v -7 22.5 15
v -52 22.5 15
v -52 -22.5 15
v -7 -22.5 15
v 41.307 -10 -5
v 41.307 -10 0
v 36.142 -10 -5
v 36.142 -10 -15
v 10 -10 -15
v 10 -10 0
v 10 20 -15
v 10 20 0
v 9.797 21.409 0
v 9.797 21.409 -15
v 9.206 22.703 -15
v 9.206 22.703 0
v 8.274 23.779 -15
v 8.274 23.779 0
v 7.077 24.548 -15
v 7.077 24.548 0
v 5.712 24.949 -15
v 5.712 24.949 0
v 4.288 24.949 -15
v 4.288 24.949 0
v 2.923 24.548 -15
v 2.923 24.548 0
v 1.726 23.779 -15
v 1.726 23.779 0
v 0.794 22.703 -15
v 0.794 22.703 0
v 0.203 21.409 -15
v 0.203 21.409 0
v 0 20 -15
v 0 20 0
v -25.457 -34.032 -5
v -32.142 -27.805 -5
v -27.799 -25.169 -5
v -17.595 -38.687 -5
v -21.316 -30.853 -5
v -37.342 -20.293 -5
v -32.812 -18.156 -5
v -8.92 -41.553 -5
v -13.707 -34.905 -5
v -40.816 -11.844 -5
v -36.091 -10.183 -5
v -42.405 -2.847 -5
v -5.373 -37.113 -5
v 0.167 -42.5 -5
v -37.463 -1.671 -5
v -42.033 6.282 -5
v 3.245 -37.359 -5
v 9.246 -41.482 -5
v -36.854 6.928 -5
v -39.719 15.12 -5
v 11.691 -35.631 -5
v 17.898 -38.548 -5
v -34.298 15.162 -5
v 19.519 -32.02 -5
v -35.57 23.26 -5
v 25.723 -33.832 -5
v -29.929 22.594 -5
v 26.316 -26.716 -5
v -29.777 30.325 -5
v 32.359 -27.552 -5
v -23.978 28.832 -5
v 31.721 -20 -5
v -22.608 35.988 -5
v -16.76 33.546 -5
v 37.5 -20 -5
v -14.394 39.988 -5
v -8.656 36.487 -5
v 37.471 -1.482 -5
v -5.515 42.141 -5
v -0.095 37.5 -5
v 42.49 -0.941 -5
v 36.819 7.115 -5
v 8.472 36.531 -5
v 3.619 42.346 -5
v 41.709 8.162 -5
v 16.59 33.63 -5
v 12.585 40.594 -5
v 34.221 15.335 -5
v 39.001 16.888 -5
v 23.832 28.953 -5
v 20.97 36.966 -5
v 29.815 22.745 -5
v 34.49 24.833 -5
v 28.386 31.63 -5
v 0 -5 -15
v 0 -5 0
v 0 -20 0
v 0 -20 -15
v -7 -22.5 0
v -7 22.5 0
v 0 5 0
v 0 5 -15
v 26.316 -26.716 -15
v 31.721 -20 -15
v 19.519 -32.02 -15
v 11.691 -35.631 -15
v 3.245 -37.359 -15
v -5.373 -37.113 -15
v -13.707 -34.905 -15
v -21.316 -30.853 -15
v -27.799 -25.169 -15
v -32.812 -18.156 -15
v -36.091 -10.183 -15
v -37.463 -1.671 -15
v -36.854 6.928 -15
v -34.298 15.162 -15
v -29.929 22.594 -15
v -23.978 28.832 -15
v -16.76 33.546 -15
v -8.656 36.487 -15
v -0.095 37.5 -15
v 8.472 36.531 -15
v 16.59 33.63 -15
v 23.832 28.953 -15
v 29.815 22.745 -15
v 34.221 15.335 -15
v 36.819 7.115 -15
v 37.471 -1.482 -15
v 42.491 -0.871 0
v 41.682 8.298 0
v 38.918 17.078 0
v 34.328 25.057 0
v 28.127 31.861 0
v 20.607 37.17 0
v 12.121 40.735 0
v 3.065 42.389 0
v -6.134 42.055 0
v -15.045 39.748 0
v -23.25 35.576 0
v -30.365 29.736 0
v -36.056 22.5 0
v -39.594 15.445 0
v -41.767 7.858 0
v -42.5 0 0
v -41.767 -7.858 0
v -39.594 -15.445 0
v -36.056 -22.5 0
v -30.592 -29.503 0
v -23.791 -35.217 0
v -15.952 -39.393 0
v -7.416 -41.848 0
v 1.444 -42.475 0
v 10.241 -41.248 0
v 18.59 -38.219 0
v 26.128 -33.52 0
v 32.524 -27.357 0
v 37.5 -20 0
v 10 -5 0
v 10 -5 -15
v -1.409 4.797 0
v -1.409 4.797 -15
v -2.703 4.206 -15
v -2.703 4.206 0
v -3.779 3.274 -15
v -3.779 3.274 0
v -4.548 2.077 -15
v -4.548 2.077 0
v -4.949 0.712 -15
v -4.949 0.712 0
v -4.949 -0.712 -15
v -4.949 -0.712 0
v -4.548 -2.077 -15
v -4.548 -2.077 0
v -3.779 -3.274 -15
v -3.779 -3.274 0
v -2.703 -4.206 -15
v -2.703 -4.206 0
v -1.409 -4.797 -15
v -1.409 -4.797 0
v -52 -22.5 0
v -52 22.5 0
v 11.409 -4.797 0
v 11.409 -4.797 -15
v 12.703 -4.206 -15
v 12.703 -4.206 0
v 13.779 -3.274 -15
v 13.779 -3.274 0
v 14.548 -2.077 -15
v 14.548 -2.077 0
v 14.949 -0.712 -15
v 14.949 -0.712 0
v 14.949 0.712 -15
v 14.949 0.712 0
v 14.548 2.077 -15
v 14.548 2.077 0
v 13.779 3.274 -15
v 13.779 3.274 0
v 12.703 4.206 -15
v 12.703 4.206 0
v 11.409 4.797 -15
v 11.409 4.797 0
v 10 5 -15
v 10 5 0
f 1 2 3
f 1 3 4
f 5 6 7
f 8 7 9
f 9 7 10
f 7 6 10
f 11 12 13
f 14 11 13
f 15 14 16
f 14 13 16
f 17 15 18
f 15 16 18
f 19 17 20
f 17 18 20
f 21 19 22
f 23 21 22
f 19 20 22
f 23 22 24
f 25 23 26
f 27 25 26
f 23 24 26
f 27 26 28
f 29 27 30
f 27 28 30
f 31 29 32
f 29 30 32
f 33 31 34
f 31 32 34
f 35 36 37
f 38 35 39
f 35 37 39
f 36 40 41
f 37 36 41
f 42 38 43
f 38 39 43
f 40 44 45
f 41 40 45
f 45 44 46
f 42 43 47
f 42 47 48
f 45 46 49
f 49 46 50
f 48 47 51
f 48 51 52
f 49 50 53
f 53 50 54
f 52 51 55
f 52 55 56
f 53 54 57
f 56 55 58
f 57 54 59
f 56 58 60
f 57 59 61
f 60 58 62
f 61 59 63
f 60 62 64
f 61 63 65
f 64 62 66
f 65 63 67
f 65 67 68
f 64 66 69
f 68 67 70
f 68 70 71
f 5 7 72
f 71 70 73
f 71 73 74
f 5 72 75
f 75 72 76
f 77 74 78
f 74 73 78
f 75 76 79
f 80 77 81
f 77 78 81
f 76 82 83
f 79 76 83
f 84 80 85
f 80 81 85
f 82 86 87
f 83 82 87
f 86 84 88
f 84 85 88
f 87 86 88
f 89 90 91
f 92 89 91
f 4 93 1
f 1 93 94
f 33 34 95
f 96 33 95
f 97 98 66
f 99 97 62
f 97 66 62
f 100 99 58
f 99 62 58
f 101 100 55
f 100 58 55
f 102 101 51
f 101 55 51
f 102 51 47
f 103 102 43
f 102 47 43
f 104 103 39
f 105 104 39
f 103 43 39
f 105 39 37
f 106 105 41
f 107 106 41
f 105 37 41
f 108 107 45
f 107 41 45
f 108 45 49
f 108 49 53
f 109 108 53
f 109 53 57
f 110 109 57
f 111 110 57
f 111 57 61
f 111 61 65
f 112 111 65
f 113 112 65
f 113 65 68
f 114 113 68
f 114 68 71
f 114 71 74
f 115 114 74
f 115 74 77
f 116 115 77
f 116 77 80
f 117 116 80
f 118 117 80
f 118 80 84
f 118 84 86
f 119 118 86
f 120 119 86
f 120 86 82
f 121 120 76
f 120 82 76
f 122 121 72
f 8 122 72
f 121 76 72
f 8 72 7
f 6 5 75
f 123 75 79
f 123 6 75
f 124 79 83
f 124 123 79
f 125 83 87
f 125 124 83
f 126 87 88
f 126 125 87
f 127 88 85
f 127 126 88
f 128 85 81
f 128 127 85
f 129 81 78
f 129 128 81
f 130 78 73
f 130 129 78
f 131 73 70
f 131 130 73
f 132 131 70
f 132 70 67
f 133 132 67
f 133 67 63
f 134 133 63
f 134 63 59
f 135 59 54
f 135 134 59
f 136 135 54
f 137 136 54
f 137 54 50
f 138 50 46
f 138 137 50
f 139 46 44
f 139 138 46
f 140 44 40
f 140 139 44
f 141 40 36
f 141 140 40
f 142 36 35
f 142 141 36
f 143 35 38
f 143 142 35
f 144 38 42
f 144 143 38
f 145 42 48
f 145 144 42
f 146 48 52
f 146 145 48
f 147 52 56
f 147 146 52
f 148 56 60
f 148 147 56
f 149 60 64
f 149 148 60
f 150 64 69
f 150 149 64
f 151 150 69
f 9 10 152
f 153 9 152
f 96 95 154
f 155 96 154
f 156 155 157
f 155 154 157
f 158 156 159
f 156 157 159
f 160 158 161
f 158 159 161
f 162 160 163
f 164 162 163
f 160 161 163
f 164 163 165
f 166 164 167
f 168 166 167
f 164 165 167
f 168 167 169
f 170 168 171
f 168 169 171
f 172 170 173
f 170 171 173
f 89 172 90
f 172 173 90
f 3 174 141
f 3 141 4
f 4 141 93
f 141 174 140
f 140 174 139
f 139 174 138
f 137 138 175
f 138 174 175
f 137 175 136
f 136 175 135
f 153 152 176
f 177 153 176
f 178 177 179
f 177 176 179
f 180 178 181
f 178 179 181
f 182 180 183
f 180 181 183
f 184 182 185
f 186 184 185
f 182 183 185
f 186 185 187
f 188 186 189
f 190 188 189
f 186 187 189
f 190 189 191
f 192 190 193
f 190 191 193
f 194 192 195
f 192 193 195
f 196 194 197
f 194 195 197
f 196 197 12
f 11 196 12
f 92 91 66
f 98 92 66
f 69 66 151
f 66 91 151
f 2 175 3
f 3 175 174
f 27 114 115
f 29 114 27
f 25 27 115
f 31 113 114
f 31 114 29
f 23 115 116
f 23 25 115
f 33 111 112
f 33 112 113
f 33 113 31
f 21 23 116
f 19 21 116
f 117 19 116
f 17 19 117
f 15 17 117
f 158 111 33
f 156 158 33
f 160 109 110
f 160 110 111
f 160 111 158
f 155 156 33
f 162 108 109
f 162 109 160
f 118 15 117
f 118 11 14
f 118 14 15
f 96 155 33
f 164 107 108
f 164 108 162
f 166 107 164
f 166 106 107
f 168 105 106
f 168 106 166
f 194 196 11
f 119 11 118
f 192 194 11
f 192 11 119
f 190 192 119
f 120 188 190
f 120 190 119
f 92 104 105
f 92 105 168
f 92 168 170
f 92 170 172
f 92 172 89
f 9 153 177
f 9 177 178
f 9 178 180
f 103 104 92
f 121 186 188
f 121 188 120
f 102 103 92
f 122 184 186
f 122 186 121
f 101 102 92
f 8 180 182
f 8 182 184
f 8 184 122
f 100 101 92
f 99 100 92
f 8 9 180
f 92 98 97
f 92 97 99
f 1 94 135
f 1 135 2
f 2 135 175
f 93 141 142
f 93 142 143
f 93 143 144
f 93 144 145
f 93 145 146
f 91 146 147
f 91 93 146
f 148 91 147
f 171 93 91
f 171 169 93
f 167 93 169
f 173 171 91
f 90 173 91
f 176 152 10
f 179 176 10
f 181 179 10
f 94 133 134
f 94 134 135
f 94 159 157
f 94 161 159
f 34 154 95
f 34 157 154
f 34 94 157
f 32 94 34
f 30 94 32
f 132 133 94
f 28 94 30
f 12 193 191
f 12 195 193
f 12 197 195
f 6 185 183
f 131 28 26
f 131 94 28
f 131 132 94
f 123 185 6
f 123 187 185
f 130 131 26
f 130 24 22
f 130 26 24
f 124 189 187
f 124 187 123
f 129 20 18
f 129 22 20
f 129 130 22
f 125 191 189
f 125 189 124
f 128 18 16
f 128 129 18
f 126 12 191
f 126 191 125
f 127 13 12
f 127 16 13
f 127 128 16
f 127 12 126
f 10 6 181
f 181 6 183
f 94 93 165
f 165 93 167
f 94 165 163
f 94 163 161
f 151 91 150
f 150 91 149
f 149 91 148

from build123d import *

# Parameters (mm, degrees)
F1_DEPTH = 5
F2_R     = 37.5
F3_DEPTH = 10
F4_DEPTH = 40.7
F6_DEPTH = 15


with BuildPart() as f1:
    # F0 (on Top) → F1 (new body)
    with BuildSketch(Plane.XY):
        with BuildLine():
            Line((10, -10), (41.306779, -10))
            ThreePointArc((41.306779, -10), (-39.719354, 15.120281), (37.5, -20))
            Line((37.5, -20), (0, -20))
            Line((0, -20), (0, -5))
            ThreePointArc((0, -5), (-5, 0), (0, 5))
            Line((0, 5), (0, 20))
            ThreePointArc((0, 20), (5, 25), (10, 20))
            Line((10, 20), (10, 5))
            ThreePointArc((10, 5), (15, 0), (10, -5))
            Line((10, -5), (10, -10))
        make_face()
        with BuildLine():
            ThreePointArc((37.5, -20), (39.719354, -15.120281), (41.306779, -10))
            Line((41.306779, -10), (10, -10))
            Line((10, -10), (10, -5))
            ThreePointArc((10, -5), (15, 0), (10, 5))
            Line((10, 5), (10, 20))
            ThreePointArc((10, 20), (5, 25), (0, 20))
            Line((0, 20), (0, 5))
            ThreePointArc((0, 5), (-5, 0), (0, -5))
            Line((0, -5), (0, -20))
            Line((0, -20), (37.5, -20))
        make_face()
    extrude(amount=-F1_DEPTH)

    # F2 (on face) → F3 (join)
    with BuildSketch(Plane(origin=(0, 0, -5), x_dir=(1, 0, 0), z_dir=(0, 0, -1))):
        Circle(F2_R)
    extrude(amount=F3_DEPTH)

    # F0 (on Top) → F4 (cut)
    with BuildSketch(Plane.XY):
        with BuildLine():
            ThreePointArc((37.5, -20), (39.719354, -15.120281), (41.306779, -10))
            Line((41.306779, -10), (10, -10))
            Line((10, -10), (10, -5))
            ThreePointArc((10, -5), (15, 0), (10, 5))
            Line((10, 5), (10, 20))
            ThreePointArc((10, 20), (5, 25), (0, 20))
            Line((0, 20), (0, 5))
            ThreePointArc((0, 5), (-5, 0), (0, -5))
            Line((0, -5), (0, -20))
            Line((0, -20), (37.5, -20))
        make_face()
    extrude(amount=-F4_DEPTH, mode=Mode.SUBTRACT)

    # F5 (on face) → F6 (join)
    with BuildSketch(Plane.XY):
        with BuildLine():
            ThreePointArc((-36.055513, -22.5), (-42.5, 0), (-36.055513, 22.5))
            Line((-36.055513, 22.5), (-52, 22.5))
            Line((-52, 22.5), (-52, -22.5))
            Line((-52, -22.5), (-36.055513, -22.5))
        make_face()
        with BuildLine():
            Line((-7, -22.5), (-7, 22.5))
            Line((-7, 22.5), (-36.055513, 22.5))
            ThreePointArc((-36.055513, 22.5), (-42.5, 0), (-36.055513, -22.5))
            Line((-36.055513, -22.5), (-7, -22.5))
        make_face()
    extrude(amount=F6_DEPTH)


solid = f1.part
